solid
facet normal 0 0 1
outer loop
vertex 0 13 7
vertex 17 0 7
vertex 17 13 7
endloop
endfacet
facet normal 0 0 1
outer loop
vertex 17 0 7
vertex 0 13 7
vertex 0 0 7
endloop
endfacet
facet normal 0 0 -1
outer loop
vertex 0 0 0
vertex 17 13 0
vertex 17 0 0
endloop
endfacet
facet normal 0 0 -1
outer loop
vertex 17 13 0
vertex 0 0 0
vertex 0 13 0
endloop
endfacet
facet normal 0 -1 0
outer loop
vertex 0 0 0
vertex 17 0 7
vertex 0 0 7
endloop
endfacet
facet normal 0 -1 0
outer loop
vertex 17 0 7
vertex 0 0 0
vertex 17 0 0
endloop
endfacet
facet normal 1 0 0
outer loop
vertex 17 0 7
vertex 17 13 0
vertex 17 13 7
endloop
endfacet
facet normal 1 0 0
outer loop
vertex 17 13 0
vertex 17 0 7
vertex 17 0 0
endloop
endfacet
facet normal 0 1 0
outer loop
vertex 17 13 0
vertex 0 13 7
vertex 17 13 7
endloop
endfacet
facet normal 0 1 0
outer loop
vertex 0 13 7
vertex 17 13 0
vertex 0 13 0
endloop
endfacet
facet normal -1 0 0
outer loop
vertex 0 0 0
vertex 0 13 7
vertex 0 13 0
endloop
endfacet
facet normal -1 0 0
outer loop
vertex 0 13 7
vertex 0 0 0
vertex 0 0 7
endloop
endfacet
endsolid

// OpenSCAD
// Generated by SolidPython 1.0.1 on 2020-07-29 00:46:56


cube(size = [17, 13, 7]);
/***********************************************
*********      SolidPython code:      **********
************************************************
 
# import packages: SolidPython
from solid import *
from solid.utils import *
from itertools import chain, combinations, permutations


class Resize:

    def __init__(self, scad_file):
        self.scad_file = scad_file
        #self.scad_file = import_scad(scad_file)
        # cone/cylinder param:
        self.r1 = 0
        self.r2 = 0
        self.h = 0
        # rectangular prism param:
        self.w = 0
        self.l = 0
        # ellipse param:
        self.r = 0

    # import OpenScad code (file name corresponds to shape)


    # classify shape + parameters
    def assign(self, param1, param2, param3):
        if self.scad_file == 'cone.scad':
            self.r1 = param1
            self.r2 = param2
            self.h = param3
        elif self.scad_file == 'cylinder.scad':
            self.r1 = param1
            self.r2 = param2
            self.h = param3
        elif self.scad_file == 'rectangularPrism.scad':
            self.h = param1
            self.l = param2
            self.w = param3
        else:
            self.r = param1
            self.h = param2

    # resize parameters
    def iterate(self):
        x = range(3, 20, 2)
        i = 1
        if self.scad_file == 'cone.scad':
            tempList = list(permutations(x, 2))
            for temp in tempList:
                param1 = temp[0]
                param2 = temp[1]
                filepath = 'produced_scad_files/' + 'cone' + str(param1) + '_' + str(param2) + '_' + '.scad'
                scad_render_to_file(cylinder(h=param1, r1=param2, r2=0), filepath)

        elif self.scad_file == 'cylinder.scad':
            tempList = list(permutations(x, 3))
            for temp in tempList:
                param1 = temp[0]
                param2 = temp[1]
                filepath = 'produced_scad_files/' + 'cylinder' + str(param1) + '_' + str(param2) + '_' + '.scad'
                scad_render_to_file(cylinder(h=param1, r1=param2, r2=param2), filepath)

        elif self.scad_file == 'rectangularPrism.scad':
            tempList = list(permutations(x, 3))
            for temp in tempList:
                param1 = temp[0]
                param2 = temp[1]
                param3 = temp[2]
                filepath = 'produced_scad_files/' + 'rectangularPrism' + str(param1) + '_' + str(param2) + '_' + str(
                    param3) + '.scad'
                scad_render_to_file(cube(size=(param1, param2, param3)), filepath)

        elif self.scad_file == 'ellipse.scad':
            tempList = list(permutations(x, 4))
            for temp in tempList:
                param1 = temp[0]
                param2 = temp[1]
                param3 = temp[2]
                param4 = temp[3]
                filepath = 'produced_scad_files/' + 'ellipse' + str(param1) + '_' + str(param2) + '_' + str(param3) + '_' + str(param4) + '.scad'
                scad_render_to_file(scale([param1, param2, param3])(sphere(r=param4)), filepath)

    def render_to_scadfile(self):
        scad_render_to_file(scad, 'example.scad') 
 
************************************************/
